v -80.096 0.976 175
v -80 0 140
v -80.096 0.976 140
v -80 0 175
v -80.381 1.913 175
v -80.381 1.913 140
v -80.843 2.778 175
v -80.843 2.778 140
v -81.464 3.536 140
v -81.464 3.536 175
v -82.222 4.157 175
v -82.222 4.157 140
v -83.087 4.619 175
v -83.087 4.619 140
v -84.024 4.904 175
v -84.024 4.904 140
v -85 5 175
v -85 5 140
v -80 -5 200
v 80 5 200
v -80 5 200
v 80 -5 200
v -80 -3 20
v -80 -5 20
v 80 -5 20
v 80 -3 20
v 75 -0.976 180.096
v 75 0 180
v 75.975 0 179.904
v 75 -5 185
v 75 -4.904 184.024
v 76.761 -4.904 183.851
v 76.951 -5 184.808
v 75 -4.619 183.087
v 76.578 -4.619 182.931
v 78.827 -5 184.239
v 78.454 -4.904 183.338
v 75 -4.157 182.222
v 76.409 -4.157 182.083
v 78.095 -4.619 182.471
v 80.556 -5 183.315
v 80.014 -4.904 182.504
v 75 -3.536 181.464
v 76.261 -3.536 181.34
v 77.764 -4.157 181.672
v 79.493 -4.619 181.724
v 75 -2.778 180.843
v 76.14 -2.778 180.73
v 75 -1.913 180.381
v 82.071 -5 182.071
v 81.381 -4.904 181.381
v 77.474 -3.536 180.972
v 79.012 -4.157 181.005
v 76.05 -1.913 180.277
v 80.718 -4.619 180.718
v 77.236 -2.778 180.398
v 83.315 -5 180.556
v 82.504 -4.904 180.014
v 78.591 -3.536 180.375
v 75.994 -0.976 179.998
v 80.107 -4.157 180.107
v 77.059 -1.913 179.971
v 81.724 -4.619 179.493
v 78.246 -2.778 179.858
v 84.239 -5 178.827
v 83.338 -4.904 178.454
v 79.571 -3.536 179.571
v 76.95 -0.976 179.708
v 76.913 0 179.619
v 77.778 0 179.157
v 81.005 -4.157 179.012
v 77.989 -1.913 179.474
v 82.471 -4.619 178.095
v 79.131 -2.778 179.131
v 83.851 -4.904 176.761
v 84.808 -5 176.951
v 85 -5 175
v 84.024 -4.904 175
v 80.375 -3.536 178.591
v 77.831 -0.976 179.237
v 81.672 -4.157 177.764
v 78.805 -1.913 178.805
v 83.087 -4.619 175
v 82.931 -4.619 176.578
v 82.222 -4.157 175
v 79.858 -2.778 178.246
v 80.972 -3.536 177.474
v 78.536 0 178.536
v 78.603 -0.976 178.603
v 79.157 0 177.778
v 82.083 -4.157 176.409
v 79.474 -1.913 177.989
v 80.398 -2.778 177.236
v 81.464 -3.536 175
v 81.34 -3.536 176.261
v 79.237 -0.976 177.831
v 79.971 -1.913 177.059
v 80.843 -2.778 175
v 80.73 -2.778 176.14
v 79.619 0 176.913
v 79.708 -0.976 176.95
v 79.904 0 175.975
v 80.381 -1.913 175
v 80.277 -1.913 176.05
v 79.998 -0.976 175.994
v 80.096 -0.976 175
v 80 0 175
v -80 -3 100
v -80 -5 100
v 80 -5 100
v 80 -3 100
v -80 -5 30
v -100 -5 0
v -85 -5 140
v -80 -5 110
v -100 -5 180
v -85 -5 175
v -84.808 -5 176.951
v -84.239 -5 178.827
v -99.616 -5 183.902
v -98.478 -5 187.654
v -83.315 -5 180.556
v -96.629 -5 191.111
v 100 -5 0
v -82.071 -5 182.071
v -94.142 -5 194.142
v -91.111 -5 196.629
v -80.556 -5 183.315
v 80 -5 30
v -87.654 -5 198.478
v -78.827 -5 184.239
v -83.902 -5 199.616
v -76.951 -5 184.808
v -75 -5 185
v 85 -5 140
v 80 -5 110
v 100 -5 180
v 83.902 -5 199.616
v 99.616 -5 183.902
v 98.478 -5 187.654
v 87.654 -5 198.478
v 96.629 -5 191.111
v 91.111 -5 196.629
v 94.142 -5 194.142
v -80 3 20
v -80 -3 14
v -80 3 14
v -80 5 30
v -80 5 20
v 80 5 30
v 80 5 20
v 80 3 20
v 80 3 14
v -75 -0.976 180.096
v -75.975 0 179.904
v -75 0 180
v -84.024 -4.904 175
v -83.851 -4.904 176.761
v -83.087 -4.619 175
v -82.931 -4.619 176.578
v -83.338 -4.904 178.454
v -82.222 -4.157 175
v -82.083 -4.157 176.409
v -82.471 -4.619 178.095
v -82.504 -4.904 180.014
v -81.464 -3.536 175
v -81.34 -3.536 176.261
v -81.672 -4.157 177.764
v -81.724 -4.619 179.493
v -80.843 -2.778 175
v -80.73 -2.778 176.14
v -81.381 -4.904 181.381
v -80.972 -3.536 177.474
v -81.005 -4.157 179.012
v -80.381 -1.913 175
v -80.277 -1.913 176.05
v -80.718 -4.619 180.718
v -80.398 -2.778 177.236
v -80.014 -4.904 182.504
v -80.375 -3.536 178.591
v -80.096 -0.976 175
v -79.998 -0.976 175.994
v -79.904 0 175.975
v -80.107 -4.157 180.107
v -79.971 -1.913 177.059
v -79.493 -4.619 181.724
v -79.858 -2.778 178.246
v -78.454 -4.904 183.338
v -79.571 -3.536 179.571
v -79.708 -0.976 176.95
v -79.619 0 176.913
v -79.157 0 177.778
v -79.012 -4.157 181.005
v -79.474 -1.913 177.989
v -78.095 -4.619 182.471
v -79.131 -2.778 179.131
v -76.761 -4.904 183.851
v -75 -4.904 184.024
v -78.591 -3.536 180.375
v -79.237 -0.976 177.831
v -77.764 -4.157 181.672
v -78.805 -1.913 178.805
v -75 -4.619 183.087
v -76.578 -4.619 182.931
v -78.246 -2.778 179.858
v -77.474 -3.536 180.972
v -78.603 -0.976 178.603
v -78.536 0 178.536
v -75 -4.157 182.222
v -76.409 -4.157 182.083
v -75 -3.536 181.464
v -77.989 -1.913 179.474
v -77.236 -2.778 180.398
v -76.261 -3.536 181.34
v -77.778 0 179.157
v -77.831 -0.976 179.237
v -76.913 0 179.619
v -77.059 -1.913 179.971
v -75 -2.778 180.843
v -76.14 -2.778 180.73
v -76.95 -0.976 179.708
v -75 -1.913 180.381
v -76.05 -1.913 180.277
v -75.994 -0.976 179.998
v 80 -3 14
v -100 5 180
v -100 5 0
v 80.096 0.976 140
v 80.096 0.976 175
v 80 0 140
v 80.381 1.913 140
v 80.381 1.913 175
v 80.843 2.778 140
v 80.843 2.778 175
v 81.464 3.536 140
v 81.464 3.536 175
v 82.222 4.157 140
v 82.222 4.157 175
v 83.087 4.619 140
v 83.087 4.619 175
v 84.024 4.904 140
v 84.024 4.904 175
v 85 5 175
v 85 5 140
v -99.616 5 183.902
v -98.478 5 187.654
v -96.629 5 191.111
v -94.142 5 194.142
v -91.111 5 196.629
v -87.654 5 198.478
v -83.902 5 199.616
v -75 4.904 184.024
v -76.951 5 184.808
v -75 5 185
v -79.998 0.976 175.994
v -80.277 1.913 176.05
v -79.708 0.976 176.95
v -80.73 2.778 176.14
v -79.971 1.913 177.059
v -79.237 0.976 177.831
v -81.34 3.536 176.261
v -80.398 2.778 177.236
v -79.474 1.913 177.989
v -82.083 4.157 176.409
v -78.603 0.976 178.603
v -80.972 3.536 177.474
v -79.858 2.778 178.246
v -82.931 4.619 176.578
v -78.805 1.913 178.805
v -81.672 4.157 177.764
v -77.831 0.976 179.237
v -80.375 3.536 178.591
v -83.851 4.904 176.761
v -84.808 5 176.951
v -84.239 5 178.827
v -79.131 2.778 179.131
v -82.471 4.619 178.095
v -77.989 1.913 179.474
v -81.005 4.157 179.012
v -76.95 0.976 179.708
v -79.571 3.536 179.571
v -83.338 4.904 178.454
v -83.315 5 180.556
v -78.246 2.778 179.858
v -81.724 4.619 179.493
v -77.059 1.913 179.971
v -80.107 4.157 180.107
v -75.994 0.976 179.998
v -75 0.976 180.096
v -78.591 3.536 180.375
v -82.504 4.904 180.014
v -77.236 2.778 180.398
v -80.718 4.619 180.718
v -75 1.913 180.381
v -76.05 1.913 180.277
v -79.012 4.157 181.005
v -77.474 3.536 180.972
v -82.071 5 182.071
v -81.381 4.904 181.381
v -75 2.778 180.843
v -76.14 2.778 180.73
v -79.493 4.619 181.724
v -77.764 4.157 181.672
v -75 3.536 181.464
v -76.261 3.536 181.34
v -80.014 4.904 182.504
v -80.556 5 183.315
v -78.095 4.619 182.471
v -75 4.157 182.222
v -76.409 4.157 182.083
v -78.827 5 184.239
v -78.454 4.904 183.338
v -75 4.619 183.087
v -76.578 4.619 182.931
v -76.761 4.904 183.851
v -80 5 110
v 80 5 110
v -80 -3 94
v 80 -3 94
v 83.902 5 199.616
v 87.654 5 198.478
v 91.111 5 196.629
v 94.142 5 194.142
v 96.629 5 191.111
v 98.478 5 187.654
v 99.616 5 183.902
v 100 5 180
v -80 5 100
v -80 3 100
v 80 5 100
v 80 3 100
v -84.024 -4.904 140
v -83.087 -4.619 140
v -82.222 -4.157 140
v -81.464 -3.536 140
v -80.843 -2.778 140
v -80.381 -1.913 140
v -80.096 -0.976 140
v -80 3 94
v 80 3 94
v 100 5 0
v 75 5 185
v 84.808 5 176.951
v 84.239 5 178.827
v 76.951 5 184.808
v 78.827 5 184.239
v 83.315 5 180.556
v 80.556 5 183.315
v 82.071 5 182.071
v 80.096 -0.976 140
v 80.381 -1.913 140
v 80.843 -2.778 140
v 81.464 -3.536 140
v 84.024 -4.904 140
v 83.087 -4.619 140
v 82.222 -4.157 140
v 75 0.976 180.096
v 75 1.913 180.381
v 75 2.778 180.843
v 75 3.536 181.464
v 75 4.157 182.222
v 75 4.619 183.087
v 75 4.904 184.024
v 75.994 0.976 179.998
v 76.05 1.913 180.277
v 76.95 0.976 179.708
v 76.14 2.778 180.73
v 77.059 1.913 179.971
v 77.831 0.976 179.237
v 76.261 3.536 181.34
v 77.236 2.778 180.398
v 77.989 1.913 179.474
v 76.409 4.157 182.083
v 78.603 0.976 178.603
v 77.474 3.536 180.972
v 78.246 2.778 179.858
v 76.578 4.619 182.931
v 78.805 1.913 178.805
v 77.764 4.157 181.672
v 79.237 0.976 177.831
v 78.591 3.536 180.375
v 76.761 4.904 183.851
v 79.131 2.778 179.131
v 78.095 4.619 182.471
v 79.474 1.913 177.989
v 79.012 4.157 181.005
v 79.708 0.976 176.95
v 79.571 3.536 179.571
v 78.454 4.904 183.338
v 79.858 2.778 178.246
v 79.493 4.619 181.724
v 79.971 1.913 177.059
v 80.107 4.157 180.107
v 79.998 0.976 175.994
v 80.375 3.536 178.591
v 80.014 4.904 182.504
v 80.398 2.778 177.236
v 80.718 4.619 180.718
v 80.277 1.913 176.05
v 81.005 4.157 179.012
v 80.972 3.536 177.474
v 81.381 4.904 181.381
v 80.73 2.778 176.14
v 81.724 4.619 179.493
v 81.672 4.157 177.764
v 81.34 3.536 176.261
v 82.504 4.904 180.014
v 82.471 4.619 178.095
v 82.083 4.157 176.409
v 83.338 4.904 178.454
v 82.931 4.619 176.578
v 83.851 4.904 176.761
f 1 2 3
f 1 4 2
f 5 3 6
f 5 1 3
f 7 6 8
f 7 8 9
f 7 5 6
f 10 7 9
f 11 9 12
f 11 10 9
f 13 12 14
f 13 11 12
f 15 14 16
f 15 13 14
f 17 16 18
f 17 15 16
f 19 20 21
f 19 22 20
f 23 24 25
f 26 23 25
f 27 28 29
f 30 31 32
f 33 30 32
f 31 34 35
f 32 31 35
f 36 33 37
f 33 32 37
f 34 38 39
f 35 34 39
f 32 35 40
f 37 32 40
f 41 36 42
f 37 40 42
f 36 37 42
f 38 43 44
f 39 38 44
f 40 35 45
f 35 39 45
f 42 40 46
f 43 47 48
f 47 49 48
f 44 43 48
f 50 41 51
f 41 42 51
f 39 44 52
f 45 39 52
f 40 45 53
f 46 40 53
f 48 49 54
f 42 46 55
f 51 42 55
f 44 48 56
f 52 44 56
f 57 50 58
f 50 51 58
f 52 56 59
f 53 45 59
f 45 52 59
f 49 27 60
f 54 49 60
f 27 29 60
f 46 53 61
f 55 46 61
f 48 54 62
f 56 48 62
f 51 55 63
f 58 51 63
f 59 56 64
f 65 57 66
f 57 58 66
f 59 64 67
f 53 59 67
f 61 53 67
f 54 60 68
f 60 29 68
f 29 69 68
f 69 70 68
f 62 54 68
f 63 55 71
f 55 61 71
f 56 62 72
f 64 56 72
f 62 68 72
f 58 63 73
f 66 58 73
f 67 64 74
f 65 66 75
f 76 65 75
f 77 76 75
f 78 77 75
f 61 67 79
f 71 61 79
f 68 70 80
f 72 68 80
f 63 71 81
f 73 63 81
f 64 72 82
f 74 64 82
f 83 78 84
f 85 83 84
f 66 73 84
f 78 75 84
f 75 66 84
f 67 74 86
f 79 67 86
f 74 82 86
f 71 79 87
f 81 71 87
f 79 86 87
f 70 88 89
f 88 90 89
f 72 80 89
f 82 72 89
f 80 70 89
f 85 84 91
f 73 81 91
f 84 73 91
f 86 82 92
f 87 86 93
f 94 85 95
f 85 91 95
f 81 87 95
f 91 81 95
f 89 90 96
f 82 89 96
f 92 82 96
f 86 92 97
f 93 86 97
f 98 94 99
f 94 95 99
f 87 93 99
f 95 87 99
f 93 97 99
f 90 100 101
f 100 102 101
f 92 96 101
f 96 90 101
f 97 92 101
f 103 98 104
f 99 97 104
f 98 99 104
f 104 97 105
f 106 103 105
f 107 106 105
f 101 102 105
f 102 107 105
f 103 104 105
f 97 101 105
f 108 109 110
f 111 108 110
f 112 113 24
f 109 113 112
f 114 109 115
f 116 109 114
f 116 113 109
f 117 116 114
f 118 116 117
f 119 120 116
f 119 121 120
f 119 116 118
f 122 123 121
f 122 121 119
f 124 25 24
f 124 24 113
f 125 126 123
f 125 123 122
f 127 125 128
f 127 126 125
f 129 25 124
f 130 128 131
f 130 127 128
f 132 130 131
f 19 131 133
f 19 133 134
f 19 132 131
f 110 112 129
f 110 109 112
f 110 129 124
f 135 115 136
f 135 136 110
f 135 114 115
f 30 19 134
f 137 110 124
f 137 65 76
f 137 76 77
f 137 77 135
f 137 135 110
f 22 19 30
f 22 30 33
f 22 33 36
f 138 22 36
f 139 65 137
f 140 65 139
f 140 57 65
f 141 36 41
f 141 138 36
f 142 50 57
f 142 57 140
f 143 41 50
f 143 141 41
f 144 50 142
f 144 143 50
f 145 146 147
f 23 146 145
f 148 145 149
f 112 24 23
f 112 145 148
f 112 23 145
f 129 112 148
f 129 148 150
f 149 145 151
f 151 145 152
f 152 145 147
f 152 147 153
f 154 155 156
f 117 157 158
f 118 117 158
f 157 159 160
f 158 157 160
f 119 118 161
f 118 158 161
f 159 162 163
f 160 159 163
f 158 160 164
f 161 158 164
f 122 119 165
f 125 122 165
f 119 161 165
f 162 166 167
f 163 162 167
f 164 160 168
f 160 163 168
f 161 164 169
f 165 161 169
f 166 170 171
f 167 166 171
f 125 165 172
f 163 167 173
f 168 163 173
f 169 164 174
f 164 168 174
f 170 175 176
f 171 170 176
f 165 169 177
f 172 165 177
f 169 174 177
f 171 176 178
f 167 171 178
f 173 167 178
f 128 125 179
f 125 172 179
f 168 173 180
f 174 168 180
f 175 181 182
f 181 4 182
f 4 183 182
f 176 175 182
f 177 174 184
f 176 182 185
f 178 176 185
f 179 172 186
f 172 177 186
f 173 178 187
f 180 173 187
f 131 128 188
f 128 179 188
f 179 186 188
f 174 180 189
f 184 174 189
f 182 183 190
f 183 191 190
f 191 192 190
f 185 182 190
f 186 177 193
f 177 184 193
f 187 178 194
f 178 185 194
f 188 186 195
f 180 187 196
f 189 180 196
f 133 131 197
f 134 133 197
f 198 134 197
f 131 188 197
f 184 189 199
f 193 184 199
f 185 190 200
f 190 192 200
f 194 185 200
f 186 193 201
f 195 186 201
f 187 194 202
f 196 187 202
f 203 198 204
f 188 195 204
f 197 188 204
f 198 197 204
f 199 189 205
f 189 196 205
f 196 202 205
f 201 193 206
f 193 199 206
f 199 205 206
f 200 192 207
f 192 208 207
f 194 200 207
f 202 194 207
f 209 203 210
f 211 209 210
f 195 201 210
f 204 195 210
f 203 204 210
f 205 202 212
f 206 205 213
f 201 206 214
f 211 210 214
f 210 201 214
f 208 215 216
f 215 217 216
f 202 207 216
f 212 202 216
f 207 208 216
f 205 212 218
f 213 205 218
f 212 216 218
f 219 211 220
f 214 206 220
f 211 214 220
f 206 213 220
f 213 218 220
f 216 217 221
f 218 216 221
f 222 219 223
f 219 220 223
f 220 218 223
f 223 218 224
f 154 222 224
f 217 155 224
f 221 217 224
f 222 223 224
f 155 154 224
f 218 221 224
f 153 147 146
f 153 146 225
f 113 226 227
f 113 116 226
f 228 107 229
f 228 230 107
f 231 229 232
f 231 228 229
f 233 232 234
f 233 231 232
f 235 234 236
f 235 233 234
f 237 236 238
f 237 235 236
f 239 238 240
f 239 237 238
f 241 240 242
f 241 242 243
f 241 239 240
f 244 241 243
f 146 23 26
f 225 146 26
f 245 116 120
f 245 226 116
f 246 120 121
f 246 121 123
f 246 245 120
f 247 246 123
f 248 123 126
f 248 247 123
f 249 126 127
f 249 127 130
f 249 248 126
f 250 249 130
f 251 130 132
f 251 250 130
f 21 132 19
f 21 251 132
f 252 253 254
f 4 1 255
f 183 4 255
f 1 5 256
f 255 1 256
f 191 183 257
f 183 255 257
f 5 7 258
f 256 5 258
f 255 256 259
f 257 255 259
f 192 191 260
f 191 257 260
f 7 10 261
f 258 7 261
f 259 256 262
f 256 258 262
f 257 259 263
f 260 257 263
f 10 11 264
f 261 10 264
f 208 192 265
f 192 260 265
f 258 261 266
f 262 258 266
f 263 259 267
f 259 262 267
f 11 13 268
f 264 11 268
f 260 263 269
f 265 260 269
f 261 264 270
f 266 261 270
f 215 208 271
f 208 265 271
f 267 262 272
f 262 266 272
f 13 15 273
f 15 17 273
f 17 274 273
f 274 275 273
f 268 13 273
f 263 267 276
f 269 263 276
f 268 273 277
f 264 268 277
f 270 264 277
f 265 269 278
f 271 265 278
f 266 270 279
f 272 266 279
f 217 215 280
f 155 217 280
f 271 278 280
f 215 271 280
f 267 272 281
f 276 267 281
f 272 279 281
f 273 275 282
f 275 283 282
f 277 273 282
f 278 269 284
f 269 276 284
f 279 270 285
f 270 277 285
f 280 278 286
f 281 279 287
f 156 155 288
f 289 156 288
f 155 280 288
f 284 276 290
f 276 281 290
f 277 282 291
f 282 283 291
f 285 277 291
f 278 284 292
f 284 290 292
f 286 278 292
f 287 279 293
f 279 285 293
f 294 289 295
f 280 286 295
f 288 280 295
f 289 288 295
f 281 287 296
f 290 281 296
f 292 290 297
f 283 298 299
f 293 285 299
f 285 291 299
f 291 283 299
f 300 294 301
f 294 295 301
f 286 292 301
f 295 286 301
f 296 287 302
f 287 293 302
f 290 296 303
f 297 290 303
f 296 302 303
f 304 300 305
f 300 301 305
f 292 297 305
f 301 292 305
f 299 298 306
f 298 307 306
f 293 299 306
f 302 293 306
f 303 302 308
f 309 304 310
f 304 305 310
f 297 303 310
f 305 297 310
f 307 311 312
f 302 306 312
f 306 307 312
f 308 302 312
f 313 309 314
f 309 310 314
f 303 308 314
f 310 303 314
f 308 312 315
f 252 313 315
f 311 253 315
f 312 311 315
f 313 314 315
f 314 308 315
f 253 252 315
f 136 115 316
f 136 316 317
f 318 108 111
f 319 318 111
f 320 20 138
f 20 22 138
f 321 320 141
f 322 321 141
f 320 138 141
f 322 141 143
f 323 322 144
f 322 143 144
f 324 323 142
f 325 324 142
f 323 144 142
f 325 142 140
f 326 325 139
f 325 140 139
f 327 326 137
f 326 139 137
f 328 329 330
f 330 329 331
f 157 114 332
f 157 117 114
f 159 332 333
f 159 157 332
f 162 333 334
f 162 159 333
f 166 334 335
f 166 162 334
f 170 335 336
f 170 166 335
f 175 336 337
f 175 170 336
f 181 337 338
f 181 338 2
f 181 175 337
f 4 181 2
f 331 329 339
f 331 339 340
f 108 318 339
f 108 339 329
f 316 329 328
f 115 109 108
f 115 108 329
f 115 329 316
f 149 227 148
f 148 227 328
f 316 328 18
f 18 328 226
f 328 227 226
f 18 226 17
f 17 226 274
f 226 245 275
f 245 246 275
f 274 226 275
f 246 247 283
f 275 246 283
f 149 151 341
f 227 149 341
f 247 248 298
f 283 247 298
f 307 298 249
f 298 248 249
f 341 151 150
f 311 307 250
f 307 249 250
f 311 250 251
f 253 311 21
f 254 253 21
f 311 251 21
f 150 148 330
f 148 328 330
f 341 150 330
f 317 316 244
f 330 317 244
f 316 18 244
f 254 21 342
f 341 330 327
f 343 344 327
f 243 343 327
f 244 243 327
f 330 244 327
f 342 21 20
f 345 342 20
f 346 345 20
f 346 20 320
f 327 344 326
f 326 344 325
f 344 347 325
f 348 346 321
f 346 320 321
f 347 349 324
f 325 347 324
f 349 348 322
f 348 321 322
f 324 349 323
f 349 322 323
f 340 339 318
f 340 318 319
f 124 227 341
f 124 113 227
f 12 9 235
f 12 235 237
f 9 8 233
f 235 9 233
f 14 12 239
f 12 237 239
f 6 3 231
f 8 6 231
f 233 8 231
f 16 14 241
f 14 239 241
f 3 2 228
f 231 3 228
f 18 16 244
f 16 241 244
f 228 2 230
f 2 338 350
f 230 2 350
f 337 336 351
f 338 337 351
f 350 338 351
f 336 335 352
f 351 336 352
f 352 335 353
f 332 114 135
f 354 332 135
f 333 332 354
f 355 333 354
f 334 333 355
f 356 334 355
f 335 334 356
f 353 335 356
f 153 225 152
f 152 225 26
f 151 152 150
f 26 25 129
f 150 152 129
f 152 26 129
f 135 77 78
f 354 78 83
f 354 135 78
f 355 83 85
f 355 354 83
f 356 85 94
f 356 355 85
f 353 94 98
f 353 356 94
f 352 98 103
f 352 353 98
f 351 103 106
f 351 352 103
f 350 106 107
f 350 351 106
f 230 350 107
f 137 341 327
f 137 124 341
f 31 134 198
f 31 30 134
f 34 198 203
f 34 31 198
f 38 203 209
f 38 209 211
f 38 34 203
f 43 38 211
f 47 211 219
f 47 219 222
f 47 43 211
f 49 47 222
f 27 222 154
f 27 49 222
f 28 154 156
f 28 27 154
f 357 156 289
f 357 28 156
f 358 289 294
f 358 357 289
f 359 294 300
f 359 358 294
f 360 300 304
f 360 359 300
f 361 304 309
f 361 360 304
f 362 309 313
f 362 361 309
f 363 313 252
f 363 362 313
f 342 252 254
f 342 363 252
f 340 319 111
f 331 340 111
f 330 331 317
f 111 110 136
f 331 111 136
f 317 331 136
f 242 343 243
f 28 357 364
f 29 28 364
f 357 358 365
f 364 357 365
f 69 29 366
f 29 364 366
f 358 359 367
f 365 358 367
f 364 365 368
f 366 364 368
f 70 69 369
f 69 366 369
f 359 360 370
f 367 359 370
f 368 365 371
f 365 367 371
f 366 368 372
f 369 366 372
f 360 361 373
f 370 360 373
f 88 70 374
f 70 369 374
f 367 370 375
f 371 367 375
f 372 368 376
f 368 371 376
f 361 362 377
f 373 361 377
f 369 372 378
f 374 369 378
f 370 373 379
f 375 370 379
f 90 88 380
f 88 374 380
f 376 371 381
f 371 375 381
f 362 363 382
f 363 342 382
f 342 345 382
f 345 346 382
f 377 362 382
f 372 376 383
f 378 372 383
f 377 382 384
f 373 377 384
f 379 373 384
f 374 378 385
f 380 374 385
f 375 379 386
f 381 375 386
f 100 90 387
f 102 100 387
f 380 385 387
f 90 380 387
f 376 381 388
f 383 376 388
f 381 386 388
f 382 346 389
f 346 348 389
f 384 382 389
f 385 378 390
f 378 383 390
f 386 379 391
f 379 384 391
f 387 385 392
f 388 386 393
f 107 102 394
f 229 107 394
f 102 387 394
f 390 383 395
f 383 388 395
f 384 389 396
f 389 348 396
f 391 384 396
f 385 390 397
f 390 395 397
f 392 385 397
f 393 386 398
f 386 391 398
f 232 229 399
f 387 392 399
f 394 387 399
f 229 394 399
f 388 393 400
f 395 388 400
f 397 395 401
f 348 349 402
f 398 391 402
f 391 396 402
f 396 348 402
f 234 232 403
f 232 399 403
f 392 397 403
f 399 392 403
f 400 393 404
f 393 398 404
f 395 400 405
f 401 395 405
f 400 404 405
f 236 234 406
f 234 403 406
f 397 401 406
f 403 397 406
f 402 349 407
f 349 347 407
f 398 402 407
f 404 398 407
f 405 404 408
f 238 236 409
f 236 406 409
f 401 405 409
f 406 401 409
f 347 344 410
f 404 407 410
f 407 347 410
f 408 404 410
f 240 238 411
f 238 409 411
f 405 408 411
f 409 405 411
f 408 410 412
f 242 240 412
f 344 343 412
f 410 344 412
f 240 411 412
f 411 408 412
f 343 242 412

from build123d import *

# Parameters (mm, degrees)
F0_W          = 160
F0_H          = 10
F0_H_2        = 40
F1_DEPTH      = 5
F1_DEPTH_BACK = 5
F2_F1_R       = 5
F2_F2_R       = 4.9999
F3_R          = 20
F4_W          = 160
F4_H          = 6
F5_DEPTH      = 6
F6_W          = 160
F6_H          = 6
F7_DEPTH      = 6


# Not quite as in the source:
# - a fillet or chamfer is up to 0.001 mm smaller than in the source, because OpenCascade refuses the exact size


with BuildPart() as f1:
    # F0 (on Front) → F1 (new body, two sides)
    with BuildSketch(Plane.XZ) as f1_sk:
        Polygon((-100, 0), (0, 0), (100, 0), (100, 200), (0, 200), (-100, 200), align=None)
        with Locations((0, 25)):
            Rectangle(F0_W, F0_H, mode=Mode.SUBTRACT)
        with Locations((0, 105)):
            Rectangle(F0_W, F0_H, mode=Mode.SUBTRACT)
        with Locations((0, 160)):
            Rectangle(F0_W, F0_H_2, mode=Mode.SUBTRACT)
    extrude(amount=F1_DEPTH)
    extrude(f1_sk.sketch, amount=-F1_DEPTH_BACK)

    # F2: fillet of radius 5 on 4 edges, made by hand

    # F2_f1
    f2_f1_edges = [f1.edges().sort_by_distance(p)[0] for p in [
        (80, 0, 180),
        (-80, 0, 180),
    ]]
    fillet(f2_f1_edges, radius=F2_F1_R)

    # F2_f2 (radius 5 in the source; OpenCascade refuses exactly that, so slightly less here)
    f2_f2_edges = [f1.edges().sort_by_distance(p)[0] for p in [
        (0, -5, 180),
        (0, 5, 180),
        (-78.5355339059, 5, 178.5355339059),
        (78.5355339059, 5, 178.5355339059),
        (-78.5355339059, -5, 178.5355339059),
        (78.5355339059, -5, 178.5355339059),
    ]]
    fillet(f2_f2_edges, radius=F2_F2_R)

    # F3
    f3_edges = [f1.edges().sort_by_distance(p)[0] for p in [
        (-100, 0, 200),
        (100, 0, 200),
    ]]
    fillet(f3_edges, radius=F3_R)

    # F4 (on face) → F5 (cut)
    with BuildSketch(Plane.XY.offset(20)):
        Rectangle(F4_W, F4_H)
    extrude(amount=-F5_DEPTH, mode=Mode.SUBTRACT)

    # F6 (on face) → F7 (cut)
    with BuildSketch(Plane.XY.offset(100)):
        Rectangle(F6_W, F6_H)
    extrude(amount=-F7_DEPTH, mode=Mode.SUBTRACT)


solid = f1.part
